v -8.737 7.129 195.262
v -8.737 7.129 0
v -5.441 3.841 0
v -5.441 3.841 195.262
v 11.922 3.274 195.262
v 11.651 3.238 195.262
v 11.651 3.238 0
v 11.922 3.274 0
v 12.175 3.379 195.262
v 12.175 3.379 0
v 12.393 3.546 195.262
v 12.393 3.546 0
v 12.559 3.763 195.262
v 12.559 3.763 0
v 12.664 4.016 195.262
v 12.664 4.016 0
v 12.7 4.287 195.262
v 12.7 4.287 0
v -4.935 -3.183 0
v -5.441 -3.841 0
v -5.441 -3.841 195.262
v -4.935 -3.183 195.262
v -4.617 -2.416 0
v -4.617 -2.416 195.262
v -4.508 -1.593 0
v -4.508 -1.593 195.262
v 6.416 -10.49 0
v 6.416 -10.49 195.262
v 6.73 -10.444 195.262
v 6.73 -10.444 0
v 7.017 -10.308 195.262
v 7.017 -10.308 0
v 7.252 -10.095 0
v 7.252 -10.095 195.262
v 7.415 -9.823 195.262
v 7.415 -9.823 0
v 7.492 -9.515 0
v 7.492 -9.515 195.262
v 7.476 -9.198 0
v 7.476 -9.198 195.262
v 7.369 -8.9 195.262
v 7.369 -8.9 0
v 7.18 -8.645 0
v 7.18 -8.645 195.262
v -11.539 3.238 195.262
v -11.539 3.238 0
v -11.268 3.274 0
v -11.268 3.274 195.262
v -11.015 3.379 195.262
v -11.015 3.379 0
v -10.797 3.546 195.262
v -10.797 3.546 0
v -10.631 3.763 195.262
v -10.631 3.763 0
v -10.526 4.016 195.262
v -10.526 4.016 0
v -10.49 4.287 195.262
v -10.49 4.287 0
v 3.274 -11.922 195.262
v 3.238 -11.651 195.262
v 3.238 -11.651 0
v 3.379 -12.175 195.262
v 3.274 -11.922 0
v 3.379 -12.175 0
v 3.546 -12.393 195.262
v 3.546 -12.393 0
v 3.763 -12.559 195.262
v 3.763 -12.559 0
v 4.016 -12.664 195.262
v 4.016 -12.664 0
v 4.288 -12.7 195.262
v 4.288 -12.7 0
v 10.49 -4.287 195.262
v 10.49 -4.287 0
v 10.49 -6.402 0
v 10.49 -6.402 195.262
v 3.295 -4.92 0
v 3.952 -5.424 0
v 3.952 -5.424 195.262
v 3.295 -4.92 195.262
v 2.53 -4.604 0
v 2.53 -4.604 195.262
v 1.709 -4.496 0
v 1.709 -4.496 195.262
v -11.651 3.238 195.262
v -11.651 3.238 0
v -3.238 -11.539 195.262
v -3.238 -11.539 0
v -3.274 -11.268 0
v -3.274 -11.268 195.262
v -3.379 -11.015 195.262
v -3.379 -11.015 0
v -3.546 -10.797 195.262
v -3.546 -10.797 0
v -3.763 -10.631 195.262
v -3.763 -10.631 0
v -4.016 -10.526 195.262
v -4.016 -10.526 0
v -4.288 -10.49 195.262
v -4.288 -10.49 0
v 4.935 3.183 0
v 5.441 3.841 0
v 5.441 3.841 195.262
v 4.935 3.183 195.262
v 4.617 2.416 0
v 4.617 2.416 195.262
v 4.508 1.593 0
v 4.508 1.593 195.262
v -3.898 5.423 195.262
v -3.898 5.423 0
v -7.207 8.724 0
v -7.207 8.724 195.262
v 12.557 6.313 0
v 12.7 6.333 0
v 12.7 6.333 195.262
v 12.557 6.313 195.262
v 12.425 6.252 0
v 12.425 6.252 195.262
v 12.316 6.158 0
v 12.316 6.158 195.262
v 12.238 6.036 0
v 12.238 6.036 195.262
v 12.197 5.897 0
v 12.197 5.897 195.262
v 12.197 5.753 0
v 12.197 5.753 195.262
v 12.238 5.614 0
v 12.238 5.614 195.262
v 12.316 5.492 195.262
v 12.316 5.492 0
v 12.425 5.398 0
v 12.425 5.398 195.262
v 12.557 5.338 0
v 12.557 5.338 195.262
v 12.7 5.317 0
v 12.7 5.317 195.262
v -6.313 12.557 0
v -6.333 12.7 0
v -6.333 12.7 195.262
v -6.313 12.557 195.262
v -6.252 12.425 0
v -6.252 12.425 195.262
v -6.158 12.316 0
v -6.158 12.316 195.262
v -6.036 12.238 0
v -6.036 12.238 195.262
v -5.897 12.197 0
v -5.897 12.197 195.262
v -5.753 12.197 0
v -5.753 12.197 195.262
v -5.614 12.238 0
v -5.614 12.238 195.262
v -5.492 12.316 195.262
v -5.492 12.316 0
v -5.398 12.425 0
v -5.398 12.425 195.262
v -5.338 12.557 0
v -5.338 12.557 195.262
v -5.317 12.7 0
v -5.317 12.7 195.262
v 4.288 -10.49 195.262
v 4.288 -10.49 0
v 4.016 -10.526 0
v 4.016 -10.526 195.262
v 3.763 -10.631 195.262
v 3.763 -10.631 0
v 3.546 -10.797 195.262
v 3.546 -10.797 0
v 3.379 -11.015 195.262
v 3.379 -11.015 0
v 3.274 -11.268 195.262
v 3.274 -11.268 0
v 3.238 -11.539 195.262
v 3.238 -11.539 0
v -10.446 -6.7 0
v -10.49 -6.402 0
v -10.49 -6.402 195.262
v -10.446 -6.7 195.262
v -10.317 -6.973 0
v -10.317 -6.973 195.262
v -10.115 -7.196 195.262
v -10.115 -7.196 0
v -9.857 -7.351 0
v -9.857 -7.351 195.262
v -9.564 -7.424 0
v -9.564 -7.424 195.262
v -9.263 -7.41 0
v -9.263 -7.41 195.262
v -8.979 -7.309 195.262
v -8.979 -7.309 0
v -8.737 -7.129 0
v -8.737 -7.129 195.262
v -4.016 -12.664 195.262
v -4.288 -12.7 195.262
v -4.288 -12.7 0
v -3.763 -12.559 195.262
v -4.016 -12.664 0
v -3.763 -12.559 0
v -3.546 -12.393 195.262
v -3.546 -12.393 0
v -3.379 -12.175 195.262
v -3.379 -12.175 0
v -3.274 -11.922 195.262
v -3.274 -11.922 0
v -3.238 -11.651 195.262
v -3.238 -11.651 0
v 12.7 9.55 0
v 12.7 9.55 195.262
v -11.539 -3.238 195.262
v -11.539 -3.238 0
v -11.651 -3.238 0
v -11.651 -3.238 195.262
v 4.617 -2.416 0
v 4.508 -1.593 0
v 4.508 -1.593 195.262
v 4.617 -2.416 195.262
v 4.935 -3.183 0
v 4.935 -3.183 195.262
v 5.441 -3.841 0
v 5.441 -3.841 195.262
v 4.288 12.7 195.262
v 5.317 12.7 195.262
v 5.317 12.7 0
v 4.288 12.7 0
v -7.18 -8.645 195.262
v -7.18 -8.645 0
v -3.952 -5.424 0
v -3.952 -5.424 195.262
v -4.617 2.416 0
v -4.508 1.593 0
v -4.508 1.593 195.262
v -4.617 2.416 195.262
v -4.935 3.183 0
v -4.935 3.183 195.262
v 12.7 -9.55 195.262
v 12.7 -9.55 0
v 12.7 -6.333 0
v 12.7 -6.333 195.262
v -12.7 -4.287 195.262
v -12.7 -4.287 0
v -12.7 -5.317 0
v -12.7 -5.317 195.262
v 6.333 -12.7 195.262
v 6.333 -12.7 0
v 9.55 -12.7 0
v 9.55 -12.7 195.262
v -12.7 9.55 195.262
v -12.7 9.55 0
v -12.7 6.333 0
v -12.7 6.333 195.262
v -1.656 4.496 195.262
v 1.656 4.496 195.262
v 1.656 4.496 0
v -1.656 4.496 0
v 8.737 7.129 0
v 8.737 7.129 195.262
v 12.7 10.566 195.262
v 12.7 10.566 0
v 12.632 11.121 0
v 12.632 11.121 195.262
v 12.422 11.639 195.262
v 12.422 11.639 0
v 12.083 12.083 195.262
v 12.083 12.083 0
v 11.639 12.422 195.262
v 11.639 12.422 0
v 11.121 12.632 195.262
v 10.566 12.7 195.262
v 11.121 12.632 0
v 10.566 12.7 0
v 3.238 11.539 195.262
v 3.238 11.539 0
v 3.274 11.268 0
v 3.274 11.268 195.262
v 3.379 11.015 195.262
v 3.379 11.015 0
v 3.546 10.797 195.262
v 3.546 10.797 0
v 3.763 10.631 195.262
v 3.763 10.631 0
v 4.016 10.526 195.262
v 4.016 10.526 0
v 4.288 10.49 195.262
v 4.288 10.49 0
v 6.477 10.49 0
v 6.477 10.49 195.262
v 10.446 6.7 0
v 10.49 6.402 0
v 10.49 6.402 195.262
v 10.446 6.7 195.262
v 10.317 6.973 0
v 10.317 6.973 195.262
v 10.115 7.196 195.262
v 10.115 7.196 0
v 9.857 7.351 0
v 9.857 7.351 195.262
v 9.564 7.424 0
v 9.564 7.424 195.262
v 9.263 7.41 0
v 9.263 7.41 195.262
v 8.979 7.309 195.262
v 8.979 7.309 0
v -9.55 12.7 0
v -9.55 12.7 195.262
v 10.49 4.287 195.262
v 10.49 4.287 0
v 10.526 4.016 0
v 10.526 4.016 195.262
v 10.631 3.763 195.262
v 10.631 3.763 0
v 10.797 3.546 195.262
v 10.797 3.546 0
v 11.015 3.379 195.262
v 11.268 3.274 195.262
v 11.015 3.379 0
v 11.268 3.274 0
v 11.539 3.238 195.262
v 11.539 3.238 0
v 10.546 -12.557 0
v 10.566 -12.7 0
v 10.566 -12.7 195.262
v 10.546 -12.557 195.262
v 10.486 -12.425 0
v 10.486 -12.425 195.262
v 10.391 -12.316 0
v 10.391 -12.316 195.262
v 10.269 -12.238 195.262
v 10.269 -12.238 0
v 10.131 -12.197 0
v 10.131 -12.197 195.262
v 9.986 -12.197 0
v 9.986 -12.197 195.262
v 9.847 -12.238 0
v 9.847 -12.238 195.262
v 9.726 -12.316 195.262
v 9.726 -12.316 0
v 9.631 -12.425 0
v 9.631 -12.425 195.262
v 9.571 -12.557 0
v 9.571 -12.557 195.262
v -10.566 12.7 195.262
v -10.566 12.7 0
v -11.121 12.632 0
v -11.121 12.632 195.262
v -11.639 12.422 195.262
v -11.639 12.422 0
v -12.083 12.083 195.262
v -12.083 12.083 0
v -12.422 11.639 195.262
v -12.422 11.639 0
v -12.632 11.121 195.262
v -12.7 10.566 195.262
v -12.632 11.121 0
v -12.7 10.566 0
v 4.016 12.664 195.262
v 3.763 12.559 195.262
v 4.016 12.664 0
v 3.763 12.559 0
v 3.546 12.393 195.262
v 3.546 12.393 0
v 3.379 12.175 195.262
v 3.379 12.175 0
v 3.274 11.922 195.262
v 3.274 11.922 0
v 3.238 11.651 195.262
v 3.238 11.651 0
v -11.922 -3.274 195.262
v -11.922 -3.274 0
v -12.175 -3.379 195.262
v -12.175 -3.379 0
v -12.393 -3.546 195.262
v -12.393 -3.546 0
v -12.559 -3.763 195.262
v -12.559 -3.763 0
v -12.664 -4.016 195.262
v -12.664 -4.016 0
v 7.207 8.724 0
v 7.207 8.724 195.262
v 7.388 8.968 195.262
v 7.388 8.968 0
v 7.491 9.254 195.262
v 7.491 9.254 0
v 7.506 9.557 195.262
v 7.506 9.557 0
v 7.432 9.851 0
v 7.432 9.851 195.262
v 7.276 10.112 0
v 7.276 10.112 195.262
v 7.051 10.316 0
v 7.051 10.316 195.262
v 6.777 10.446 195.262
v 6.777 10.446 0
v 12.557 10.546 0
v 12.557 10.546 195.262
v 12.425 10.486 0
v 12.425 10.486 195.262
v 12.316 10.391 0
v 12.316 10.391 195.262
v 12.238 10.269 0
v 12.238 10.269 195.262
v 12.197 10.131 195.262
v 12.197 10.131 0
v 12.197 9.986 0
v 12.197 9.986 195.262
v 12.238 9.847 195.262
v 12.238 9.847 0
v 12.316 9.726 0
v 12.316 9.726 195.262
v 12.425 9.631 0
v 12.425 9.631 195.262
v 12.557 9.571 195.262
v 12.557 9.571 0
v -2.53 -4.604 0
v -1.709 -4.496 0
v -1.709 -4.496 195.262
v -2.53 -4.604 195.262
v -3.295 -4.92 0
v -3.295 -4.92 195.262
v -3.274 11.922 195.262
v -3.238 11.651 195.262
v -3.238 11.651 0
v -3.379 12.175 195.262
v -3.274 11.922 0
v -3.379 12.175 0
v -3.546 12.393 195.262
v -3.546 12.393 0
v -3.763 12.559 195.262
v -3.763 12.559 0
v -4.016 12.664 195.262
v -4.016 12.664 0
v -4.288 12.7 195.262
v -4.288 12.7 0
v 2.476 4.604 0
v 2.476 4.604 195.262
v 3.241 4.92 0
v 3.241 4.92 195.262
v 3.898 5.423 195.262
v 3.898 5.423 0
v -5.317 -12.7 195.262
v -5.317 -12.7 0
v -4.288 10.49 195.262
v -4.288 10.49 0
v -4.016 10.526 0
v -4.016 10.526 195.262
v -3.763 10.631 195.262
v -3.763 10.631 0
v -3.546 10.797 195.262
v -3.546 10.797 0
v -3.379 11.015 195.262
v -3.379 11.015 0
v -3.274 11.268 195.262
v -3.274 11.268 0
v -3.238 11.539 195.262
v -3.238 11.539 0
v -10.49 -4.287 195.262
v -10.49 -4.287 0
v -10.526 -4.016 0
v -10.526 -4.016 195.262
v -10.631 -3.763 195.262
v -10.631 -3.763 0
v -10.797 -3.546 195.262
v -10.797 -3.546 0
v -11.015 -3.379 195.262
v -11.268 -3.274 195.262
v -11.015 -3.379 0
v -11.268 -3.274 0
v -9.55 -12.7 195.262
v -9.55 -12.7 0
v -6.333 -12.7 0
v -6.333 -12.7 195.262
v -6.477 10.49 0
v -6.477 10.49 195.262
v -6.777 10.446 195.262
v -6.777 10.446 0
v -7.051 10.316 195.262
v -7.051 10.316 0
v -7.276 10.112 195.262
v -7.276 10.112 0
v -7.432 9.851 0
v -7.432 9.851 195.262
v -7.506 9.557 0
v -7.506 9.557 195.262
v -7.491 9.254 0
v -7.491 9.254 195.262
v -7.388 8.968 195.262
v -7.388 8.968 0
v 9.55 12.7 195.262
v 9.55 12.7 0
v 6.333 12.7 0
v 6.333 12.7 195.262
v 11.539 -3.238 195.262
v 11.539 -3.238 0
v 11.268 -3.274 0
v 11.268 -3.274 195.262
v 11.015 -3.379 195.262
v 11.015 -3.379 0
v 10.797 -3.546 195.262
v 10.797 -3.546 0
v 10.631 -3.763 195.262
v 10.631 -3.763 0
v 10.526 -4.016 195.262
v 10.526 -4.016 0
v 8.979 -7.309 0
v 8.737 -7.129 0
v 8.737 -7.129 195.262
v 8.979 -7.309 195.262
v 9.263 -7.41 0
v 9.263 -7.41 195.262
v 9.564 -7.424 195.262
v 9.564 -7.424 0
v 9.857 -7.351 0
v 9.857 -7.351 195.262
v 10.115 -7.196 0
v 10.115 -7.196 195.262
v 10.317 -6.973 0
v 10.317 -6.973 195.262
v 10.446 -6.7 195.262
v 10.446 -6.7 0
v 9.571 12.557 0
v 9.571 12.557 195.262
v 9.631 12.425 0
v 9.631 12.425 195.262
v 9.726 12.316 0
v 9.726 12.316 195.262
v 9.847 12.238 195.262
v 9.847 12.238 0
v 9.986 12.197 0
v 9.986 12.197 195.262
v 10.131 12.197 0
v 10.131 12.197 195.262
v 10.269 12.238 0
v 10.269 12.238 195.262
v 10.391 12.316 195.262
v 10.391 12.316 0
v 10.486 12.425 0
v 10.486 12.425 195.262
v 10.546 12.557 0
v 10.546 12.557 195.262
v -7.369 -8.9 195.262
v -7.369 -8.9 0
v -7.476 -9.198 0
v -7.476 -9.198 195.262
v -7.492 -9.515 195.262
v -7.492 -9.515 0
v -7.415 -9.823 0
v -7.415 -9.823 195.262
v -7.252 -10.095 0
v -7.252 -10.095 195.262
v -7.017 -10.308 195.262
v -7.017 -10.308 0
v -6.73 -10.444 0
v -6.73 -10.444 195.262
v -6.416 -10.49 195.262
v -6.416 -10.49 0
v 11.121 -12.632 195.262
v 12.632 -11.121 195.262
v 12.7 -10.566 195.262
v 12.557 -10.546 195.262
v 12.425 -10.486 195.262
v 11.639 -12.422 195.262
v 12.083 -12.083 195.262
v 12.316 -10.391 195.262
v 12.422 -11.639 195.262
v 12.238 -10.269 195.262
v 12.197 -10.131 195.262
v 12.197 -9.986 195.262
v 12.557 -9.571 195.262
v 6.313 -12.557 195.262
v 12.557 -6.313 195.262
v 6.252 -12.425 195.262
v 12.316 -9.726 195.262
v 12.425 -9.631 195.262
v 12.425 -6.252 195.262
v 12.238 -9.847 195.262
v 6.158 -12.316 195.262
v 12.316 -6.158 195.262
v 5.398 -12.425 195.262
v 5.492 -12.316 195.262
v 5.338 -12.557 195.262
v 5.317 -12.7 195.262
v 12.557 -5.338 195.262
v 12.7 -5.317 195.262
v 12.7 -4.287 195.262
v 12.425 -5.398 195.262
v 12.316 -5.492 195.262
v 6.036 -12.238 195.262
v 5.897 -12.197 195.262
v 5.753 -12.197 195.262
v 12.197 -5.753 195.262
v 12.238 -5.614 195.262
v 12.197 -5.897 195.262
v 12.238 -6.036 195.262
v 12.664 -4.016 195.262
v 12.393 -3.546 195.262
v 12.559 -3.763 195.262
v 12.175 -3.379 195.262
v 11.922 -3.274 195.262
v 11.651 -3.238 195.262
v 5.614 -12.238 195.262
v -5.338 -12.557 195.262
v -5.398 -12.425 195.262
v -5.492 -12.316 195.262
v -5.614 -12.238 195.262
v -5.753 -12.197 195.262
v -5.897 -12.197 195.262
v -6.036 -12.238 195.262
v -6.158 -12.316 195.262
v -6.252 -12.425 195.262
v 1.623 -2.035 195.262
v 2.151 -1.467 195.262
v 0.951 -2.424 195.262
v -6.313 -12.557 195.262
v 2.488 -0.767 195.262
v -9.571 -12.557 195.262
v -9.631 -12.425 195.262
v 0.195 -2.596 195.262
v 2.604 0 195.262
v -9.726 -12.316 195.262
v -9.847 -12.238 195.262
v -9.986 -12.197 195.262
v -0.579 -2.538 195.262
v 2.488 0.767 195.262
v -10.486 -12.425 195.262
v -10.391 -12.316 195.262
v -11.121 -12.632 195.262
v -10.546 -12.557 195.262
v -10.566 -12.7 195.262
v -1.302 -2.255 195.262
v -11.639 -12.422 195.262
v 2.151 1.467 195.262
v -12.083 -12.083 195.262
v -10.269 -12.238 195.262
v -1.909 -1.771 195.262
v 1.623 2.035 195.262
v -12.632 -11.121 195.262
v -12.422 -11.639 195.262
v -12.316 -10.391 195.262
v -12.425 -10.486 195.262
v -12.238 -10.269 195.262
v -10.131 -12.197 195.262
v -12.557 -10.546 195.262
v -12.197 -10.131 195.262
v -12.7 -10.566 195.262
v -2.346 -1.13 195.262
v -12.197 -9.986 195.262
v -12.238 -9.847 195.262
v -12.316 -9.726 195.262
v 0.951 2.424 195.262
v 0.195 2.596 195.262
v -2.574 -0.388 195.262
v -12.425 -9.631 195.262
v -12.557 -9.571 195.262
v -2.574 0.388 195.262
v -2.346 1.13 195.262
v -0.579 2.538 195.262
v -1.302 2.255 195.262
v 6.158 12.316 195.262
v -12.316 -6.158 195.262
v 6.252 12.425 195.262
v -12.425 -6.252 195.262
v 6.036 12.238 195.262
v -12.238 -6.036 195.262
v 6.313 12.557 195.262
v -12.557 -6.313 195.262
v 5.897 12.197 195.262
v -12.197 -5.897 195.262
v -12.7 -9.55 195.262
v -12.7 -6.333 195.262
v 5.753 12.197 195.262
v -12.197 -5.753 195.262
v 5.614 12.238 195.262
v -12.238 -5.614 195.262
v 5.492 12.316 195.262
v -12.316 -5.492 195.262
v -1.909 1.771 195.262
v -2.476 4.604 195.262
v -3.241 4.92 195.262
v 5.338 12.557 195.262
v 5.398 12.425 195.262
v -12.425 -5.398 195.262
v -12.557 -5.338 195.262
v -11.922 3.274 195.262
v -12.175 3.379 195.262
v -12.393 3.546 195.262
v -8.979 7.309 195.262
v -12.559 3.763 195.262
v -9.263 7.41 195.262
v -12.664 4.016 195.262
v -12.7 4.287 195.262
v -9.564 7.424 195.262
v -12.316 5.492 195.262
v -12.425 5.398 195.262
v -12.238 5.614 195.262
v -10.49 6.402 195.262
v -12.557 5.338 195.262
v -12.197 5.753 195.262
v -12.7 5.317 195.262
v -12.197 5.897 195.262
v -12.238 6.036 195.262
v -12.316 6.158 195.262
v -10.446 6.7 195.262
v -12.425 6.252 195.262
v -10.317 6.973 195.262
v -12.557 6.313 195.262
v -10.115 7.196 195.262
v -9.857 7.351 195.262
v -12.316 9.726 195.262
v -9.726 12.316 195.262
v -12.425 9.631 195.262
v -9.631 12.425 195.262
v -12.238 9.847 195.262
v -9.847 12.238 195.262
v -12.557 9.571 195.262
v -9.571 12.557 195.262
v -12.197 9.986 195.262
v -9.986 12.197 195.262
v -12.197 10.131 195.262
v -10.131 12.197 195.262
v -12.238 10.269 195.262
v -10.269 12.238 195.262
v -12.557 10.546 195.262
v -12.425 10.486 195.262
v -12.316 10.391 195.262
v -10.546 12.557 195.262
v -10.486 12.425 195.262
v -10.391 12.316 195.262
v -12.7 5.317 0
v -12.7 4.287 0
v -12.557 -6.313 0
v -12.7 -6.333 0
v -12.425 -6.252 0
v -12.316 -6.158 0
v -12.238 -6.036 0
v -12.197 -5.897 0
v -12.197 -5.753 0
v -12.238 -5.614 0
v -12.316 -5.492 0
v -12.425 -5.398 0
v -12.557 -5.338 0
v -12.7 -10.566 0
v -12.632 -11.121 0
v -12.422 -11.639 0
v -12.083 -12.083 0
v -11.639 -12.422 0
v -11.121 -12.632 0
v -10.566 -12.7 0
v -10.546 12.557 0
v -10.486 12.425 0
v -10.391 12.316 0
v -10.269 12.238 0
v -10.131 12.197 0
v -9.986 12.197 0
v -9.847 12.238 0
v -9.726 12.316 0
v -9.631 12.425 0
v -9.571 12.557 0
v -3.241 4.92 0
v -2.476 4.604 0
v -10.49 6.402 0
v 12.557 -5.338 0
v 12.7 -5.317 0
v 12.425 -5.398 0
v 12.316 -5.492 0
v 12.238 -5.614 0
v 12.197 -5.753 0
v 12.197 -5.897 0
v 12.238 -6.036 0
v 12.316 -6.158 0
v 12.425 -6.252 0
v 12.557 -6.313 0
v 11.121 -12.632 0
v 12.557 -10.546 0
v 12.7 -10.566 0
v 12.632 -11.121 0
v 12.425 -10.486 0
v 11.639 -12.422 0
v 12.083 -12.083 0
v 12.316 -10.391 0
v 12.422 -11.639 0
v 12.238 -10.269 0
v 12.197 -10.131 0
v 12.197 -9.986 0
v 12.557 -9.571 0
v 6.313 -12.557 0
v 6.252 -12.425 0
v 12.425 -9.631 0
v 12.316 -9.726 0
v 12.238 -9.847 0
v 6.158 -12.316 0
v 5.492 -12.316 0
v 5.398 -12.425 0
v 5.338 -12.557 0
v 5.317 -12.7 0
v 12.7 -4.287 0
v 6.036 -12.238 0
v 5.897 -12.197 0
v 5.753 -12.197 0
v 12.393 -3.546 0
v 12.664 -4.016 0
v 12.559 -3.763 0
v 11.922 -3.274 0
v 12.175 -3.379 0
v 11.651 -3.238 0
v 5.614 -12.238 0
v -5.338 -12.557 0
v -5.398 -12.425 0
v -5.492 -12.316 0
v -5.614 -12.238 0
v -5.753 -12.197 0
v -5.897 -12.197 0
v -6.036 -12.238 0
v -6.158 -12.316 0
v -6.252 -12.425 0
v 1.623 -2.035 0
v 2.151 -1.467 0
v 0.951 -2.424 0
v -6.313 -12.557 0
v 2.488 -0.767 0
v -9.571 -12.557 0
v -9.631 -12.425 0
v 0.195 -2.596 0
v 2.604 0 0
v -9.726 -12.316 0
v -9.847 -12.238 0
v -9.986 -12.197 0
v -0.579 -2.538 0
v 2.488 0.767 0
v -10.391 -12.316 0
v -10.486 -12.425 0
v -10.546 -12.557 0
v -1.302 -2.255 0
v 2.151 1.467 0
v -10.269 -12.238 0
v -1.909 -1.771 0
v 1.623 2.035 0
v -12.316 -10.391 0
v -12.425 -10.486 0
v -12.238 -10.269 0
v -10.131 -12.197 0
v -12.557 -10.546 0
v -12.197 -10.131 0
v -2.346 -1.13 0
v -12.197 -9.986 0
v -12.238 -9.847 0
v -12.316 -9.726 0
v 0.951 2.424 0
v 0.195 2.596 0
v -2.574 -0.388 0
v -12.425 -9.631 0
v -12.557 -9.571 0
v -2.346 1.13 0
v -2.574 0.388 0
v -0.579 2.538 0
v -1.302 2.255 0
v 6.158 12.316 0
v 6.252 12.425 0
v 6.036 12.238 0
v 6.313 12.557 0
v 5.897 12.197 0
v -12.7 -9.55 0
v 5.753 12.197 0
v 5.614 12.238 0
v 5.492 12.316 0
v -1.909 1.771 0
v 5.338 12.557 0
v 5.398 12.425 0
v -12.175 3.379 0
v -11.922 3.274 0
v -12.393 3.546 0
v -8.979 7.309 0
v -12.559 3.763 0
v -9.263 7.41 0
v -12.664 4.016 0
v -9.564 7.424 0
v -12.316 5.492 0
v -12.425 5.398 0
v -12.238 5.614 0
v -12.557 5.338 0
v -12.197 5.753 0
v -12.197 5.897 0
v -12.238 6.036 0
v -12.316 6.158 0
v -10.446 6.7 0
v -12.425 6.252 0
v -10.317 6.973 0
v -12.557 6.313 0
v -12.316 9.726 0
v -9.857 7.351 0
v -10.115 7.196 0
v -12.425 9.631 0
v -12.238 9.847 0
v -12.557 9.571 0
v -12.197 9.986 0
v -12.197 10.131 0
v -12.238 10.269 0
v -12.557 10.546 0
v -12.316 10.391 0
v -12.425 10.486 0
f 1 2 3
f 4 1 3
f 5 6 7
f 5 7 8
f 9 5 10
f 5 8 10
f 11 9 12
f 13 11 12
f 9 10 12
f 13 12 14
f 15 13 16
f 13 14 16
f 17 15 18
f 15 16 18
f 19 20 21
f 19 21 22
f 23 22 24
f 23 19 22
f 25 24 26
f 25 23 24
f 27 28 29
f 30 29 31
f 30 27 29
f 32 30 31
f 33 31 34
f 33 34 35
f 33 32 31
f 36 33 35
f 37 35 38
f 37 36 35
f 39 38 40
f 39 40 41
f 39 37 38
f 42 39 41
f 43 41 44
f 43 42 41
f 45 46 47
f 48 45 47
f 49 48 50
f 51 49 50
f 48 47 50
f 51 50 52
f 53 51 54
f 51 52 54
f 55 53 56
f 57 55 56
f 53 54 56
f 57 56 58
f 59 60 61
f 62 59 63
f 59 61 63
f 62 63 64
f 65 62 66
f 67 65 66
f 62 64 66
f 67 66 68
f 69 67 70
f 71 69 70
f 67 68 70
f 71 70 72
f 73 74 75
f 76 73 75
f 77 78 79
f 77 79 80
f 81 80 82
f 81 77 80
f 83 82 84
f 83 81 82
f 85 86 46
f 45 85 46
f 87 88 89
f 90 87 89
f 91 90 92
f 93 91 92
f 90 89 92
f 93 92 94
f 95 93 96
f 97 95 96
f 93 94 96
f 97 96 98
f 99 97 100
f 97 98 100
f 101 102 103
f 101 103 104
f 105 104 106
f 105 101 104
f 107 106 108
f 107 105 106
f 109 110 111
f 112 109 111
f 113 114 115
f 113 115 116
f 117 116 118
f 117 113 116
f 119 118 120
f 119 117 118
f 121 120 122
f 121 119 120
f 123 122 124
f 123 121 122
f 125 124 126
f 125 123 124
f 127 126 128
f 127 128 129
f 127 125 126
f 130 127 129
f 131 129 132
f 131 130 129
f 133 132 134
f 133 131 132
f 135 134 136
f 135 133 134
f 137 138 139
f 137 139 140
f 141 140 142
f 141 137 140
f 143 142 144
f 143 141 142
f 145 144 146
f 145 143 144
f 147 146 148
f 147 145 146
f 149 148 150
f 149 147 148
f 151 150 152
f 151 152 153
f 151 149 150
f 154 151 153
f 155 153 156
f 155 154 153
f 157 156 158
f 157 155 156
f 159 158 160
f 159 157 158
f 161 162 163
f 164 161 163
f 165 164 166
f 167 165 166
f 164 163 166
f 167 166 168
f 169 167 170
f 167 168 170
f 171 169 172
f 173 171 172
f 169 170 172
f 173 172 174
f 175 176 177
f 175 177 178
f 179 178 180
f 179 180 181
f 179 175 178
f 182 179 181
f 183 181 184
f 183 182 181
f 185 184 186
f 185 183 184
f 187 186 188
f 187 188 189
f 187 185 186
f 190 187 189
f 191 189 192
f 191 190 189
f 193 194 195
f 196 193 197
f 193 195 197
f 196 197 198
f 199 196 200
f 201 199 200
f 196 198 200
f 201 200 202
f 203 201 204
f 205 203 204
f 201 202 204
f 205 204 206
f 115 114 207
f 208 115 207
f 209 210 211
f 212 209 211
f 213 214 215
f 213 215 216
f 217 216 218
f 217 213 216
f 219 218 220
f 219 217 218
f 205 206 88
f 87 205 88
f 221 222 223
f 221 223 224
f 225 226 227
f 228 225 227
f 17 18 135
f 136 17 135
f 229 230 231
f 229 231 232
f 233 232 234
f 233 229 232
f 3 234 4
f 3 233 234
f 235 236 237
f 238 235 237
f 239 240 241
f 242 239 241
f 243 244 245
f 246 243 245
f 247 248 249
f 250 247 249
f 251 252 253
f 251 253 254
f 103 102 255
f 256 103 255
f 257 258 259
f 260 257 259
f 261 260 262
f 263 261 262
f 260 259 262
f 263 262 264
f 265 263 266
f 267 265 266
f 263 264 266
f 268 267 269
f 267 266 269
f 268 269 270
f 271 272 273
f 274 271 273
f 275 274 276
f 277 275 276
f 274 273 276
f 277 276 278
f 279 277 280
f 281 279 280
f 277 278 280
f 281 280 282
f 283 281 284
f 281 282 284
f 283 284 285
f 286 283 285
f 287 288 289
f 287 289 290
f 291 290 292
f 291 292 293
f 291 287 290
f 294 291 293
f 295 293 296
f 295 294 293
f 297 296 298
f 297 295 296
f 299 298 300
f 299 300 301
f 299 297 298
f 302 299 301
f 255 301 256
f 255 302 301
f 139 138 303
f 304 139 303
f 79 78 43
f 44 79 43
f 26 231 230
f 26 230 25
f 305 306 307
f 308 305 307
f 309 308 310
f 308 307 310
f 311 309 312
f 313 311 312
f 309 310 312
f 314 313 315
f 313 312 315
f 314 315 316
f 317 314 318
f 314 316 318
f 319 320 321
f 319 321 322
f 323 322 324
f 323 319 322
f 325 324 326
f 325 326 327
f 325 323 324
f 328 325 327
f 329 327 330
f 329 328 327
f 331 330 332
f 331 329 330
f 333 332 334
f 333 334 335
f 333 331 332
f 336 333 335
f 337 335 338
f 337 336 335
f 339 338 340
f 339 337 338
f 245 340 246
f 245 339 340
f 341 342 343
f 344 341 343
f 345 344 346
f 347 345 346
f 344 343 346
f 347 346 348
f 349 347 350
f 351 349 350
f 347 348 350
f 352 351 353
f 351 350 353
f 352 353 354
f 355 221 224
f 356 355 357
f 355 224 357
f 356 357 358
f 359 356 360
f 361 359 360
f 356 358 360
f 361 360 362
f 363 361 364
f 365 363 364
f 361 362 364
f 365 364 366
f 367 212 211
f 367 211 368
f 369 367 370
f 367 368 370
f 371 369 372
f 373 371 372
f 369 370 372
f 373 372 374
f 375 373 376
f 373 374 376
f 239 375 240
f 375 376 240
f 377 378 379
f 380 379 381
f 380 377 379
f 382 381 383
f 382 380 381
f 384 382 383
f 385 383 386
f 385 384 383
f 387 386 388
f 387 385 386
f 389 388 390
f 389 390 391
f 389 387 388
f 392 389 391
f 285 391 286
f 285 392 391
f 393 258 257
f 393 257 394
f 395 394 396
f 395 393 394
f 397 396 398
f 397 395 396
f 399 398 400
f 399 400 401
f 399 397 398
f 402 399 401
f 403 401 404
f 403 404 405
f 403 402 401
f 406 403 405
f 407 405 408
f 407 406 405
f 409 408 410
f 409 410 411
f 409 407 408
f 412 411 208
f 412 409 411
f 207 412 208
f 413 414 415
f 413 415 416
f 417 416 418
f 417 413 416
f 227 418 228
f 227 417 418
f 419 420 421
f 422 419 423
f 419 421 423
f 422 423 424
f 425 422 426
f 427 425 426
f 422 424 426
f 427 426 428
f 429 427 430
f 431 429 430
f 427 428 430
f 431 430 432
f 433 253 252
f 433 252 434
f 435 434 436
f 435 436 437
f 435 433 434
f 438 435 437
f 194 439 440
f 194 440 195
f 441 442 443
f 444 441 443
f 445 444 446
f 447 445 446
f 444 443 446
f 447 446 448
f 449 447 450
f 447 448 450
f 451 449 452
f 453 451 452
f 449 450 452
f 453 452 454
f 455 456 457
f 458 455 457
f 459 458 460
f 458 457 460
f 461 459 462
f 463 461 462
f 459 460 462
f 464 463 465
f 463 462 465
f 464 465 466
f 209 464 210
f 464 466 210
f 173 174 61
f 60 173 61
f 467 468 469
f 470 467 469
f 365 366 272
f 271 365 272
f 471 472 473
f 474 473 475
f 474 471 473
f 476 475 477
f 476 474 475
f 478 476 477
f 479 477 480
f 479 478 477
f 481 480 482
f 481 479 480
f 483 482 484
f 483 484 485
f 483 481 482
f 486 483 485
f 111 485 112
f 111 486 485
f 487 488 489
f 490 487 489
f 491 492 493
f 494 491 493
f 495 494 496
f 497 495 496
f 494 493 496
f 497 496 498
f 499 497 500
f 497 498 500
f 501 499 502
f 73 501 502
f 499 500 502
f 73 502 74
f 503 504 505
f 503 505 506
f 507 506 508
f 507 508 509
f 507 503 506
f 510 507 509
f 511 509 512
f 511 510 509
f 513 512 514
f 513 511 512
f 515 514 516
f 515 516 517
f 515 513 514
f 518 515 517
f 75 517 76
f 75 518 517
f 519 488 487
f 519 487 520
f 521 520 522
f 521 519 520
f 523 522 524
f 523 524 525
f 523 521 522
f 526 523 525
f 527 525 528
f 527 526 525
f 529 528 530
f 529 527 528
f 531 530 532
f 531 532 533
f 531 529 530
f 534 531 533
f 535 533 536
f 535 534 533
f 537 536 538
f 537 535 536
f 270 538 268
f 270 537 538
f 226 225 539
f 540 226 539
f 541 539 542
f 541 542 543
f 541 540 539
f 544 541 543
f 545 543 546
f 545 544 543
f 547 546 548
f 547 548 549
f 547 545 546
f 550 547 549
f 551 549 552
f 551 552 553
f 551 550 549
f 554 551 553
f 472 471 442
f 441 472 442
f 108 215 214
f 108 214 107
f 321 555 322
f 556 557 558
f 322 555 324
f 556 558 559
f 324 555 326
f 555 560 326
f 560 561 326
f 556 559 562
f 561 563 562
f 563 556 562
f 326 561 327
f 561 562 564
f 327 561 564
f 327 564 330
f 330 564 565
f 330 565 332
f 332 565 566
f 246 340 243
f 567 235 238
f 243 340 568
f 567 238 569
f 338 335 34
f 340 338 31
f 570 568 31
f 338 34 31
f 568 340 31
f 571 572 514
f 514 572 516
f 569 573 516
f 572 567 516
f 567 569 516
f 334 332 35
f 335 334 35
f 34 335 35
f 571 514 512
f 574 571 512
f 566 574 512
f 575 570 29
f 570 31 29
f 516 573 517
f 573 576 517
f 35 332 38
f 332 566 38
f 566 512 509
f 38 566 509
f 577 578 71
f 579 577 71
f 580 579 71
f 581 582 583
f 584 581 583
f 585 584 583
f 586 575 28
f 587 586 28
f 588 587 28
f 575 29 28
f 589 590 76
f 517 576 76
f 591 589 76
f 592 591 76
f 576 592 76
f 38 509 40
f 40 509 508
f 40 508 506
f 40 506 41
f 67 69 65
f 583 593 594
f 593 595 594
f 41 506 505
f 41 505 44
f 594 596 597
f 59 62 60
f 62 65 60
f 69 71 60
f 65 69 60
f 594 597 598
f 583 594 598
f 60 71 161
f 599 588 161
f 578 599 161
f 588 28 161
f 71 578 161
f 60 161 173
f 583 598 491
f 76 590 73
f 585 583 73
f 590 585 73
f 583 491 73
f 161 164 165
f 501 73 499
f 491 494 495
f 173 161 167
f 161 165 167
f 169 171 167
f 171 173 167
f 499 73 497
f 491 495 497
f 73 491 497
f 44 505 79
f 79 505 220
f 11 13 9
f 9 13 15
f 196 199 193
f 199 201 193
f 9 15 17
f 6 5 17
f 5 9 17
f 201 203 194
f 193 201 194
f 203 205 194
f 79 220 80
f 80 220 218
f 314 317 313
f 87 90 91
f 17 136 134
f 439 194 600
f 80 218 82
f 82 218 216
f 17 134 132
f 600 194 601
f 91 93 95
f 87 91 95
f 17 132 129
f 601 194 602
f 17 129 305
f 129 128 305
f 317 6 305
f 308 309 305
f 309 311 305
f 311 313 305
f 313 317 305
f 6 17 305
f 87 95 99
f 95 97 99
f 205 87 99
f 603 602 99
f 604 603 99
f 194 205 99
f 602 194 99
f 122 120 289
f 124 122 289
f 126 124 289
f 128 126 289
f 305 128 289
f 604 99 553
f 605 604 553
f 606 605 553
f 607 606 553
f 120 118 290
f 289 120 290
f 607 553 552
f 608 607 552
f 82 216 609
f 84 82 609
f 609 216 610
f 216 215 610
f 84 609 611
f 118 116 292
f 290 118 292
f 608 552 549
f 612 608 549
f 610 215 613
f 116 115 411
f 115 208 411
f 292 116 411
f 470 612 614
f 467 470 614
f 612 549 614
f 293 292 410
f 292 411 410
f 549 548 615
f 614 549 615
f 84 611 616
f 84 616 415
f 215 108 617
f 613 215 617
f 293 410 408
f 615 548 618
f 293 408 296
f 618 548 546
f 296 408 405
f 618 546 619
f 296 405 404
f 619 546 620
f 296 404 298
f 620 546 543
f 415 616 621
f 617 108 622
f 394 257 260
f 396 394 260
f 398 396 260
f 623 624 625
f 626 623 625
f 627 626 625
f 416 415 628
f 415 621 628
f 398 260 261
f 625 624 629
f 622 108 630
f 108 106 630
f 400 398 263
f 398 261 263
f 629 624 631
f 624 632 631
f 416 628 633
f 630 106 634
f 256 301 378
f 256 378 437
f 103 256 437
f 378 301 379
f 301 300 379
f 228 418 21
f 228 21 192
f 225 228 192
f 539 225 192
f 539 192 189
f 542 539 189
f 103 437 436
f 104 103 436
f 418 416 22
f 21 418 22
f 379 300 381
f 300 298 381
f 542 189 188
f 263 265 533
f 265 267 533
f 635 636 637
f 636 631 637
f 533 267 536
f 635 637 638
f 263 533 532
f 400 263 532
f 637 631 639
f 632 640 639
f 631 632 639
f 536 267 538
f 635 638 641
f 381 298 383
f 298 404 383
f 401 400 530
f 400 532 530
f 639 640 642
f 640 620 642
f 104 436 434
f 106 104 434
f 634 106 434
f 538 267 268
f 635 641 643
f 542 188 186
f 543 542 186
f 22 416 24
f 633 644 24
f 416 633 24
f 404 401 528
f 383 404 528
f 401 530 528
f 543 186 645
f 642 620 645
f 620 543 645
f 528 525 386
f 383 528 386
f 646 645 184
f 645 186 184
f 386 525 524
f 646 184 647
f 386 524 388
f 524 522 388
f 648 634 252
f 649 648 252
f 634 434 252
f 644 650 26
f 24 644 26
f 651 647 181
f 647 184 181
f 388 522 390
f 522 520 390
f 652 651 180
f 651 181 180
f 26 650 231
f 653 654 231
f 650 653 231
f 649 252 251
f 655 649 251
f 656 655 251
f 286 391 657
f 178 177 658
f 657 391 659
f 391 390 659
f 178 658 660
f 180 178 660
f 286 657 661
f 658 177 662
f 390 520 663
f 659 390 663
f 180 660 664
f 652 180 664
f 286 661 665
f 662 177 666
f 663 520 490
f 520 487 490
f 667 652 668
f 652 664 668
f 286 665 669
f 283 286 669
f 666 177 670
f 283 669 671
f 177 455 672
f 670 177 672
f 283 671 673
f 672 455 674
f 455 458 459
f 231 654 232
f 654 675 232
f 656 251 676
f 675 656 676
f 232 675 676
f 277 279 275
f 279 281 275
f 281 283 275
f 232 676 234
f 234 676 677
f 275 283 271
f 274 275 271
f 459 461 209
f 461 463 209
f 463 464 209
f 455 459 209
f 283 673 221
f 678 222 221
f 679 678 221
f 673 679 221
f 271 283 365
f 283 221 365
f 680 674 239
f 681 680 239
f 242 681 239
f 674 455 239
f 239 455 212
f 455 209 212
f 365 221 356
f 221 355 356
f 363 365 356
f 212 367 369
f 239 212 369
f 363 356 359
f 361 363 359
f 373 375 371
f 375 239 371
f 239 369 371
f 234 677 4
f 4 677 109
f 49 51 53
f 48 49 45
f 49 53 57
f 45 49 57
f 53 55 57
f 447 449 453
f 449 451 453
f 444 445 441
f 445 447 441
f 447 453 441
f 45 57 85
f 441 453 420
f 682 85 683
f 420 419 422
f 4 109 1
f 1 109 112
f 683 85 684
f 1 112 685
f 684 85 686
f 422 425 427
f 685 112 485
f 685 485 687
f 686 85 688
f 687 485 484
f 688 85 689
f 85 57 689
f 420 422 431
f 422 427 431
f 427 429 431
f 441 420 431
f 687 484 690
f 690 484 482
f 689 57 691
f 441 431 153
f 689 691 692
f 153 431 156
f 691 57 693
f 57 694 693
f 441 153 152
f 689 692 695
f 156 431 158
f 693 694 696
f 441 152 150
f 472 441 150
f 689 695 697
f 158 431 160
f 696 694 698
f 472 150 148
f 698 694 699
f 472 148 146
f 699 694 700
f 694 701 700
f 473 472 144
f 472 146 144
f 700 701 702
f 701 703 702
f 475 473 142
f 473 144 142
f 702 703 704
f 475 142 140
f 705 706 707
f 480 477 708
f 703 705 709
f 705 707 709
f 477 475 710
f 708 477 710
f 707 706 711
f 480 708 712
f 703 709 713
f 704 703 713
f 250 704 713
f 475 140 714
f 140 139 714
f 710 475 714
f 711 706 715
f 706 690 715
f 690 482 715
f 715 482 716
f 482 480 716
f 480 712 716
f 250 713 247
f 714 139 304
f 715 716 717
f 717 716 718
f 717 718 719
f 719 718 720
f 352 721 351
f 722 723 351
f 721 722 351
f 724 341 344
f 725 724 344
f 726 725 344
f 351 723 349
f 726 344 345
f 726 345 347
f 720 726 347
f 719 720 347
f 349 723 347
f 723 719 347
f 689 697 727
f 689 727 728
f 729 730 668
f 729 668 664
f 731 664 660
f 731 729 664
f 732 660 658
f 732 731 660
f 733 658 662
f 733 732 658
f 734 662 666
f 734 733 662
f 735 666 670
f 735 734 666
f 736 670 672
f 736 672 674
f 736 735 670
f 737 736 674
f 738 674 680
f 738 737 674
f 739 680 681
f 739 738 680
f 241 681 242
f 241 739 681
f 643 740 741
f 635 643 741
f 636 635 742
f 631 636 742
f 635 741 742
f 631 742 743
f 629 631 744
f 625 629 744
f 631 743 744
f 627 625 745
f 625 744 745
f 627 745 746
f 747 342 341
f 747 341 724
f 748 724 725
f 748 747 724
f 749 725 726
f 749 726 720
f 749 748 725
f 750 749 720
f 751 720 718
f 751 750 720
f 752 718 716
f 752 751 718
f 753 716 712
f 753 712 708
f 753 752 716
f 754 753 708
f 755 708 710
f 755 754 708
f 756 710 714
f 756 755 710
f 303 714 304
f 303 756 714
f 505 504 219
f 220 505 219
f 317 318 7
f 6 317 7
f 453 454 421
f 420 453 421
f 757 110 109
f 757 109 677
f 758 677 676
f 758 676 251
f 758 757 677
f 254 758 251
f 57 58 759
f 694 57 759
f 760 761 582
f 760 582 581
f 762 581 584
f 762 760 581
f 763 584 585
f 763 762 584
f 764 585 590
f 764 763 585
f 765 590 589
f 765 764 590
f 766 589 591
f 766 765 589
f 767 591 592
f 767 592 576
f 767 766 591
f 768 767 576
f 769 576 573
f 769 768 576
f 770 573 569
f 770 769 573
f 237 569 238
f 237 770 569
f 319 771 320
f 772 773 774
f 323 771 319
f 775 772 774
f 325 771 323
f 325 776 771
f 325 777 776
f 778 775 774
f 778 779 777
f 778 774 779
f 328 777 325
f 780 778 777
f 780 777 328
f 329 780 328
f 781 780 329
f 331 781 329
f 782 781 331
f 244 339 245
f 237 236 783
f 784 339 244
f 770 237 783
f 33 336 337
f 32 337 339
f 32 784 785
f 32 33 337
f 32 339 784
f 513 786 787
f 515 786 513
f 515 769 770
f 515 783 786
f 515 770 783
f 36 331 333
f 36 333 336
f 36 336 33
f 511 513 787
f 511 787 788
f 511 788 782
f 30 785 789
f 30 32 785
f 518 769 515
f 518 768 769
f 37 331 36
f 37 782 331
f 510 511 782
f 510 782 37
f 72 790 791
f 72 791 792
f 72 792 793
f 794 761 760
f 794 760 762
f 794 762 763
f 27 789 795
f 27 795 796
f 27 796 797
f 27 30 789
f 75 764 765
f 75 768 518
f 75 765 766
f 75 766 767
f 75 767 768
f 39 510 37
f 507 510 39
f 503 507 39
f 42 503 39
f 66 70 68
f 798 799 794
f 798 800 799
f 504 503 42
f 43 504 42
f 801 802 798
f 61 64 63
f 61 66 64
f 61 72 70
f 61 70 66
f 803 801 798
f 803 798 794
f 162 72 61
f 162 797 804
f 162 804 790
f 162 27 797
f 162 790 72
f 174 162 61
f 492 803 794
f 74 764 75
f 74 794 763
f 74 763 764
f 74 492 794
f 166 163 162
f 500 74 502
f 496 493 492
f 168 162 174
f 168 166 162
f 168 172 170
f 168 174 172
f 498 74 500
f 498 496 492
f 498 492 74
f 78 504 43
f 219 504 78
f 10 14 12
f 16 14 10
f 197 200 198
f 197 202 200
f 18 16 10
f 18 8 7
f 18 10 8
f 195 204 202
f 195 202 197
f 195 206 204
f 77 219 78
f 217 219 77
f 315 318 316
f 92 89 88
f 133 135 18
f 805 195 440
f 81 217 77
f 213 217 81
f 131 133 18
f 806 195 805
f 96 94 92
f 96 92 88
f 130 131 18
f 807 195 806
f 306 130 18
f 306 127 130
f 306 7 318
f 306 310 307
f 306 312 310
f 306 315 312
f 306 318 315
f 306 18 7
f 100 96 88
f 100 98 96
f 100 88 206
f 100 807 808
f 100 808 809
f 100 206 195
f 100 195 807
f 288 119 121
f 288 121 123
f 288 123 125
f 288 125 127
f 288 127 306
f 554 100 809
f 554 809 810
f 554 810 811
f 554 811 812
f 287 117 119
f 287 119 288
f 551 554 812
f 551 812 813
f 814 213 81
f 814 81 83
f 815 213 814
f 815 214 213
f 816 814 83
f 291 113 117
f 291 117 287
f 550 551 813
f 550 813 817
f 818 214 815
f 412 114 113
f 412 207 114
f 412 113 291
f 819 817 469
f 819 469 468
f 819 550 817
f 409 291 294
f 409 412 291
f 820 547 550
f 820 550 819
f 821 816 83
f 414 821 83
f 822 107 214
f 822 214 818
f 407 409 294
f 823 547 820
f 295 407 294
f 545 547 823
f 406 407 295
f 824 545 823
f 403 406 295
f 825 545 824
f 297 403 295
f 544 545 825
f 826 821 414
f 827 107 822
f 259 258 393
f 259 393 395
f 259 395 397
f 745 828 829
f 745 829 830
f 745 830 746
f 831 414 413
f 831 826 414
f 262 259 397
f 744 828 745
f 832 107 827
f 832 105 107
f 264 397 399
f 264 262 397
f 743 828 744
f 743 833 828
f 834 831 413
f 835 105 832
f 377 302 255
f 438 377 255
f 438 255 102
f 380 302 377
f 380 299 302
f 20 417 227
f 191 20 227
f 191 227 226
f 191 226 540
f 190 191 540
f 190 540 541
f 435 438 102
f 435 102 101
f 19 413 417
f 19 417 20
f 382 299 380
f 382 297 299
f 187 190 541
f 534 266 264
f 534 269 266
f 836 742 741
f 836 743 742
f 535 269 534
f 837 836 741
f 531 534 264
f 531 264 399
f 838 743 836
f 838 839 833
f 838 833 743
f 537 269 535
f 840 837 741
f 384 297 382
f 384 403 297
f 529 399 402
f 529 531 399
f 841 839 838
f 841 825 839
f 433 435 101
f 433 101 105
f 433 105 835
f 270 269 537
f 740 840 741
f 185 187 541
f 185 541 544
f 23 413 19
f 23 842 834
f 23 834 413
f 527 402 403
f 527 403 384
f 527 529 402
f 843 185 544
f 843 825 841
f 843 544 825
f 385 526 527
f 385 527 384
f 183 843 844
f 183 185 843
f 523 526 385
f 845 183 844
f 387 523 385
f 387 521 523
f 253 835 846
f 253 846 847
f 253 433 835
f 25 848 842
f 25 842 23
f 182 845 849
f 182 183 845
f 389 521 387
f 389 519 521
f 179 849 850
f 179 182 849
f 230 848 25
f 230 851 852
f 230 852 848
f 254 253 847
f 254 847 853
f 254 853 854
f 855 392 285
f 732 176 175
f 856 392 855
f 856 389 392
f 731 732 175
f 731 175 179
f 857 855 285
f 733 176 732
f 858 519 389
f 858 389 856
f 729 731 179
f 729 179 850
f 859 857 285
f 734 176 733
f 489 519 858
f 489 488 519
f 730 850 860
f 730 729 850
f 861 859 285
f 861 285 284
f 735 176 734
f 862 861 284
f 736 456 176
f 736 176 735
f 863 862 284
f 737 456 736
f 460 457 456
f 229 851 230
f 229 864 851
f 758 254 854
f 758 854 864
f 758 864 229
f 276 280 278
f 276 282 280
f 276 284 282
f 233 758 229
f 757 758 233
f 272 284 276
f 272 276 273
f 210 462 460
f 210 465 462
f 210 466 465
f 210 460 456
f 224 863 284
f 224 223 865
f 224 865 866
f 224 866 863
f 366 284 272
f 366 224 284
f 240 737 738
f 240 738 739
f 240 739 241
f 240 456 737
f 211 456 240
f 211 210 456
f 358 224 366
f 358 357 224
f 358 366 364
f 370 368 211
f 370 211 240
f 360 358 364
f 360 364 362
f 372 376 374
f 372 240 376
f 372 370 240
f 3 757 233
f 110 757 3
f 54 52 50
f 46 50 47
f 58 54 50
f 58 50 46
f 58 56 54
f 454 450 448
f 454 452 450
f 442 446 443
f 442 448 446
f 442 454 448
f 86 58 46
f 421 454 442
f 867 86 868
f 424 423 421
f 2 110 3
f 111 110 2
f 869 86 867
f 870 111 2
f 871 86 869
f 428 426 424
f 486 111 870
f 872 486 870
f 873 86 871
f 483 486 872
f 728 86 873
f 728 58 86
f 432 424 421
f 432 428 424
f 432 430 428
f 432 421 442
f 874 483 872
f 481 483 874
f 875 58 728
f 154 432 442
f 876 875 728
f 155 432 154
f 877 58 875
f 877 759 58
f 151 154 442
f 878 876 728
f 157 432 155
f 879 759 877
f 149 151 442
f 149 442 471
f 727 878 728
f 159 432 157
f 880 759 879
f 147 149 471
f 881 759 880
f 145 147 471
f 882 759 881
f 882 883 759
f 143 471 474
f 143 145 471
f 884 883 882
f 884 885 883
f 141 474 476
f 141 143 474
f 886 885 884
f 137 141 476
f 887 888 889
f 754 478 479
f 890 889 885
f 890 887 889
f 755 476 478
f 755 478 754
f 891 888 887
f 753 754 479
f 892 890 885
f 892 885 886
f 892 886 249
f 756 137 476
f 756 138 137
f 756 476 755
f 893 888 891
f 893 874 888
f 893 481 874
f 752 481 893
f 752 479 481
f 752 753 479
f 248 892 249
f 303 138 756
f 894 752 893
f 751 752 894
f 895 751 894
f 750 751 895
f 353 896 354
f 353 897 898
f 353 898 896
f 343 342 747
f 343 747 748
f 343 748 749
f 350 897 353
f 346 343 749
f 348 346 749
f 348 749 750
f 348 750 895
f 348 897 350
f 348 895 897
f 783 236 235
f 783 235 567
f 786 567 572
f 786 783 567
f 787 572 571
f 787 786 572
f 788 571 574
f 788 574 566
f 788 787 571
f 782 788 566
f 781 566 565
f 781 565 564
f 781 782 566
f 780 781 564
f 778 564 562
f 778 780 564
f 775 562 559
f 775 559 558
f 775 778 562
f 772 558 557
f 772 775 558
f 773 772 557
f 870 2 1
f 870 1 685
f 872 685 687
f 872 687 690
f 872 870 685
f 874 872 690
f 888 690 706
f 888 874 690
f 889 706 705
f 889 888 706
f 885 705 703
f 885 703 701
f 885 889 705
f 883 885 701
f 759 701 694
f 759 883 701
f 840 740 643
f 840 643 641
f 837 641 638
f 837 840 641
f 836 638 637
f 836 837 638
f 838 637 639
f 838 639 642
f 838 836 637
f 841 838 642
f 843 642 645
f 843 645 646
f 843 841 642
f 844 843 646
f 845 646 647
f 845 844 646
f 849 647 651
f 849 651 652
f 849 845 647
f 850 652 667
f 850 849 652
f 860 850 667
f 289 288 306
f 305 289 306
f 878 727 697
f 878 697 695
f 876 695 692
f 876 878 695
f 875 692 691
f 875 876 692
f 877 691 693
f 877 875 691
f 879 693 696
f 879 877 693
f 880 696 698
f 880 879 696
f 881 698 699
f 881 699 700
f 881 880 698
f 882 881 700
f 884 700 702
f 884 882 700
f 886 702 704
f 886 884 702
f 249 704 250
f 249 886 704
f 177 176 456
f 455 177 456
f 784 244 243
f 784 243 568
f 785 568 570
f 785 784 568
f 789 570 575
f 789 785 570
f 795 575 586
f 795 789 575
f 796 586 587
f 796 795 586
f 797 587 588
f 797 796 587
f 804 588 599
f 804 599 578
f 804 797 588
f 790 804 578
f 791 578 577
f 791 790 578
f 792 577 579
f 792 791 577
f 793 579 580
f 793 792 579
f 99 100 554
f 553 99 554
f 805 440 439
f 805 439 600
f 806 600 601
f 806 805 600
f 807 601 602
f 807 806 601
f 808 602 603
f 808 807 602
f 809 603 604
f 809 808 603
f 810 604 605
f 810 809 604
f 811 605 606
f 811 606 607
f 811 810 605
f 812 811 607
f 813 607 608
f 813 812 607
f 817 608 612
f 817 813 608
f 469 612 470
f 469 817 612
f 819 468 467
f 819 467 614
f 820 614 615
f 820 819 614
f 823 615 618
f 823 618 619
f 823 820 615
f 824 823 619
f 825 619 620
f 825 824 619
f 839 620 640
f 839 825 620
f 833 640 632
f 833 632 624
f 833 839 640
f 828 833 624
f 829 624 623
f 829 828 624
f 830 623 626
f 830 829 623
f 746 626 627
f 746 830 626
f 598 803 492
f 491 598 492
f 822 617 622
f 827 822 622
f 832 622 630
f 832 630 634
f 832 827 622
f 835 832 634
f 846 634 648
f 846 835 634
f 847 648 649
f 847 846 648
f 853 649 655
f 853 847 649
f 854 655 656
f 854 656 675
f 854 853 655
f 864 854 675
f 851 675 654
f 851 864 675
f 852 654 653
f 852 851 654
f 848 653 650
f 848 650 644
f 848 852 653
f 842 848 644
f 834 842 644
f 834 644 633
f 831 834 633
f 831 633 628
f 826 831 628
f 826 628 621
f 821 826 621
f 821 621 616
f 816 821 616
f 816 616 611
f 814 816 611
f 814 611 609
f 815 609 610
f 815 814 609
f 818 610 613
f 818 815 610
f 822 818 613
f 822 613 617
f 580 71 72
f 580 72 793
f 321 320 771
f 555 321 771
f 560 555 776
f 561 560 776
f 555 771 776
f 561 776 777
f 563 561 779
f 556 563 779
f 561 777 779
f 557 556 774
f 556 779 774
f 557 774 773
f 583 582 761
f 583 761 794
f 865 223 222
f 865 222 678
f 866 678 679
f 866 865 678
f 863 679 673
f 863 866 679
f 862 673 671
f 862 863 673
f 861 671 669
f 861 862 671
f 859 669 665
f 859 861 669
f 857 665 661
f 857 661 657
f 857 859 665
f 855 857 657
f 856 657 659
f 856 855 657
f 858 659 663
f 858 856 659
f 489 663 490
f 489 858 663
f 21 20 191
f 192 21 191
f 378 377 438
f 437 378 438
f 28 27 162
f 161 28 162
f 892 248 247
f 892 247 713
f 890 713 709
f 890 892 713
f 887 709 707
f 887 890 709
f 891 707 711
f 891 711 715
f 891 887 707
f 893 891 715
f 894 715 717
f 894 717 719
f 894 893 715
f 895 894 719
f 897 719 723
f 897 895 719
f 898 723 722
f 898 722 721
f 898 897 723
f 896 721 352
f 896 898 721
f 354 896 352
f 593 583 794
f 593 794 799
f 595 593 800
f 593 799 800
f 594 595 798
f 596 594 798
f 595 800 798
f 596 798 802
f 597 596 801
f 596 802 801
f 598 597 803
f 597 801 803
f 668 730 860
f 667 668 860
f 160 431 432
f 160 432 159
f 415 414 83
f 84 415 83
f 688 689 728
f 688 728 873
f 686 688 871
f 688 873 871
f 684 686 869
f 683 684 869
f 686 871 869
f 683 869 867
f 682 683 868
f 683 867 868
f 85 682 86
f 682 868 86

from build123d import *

# Parameters (mm, degrees)
SKETCH097_R   = 2.6035
EXTRUDE_DEPTH = 195.262


with BuildPart() as part:
    # Sketch097 → Extrude (new body)
    with BuildSketch(Plane.XY):
        with BuildLine():
            ThreePointArc((12.7, 6.333084), (12.192, 5.825084), (12.7, 5.317084))
            Line((12.7, 4.287469), (12.7, 5.317084))
            ThreePointArc((11.650988, 3.238457), (12.392751, 3.545706), (12.7, 4.287469))
            Line((11.539212, 3.238457), (11.650988, 3.238457))
            ThreePointArc((10.4902, 4.287469), (10.797449, 3.545706), (11.539212, 3.238457))
            Line((10.4902, 6.402089), (10.4902, 4.287469))
            ThreePointArc((10.4902, 6.402089), (9.856505, 7.351068), (8.737131, 7.129409))
            Line((5.441006, 3.840816), (8.737131, 7.129409))
            ThreePointArc((5.441006, 3.840816), (4.750878, 2.809883), (4.5085, 1.593186))
            Line((4.5085, -1.593186), (4.5085, 1.593186))
            ThreePointArc((4.5085, -1.593186), (4.750878, -2.809883), (5.441006, -3.840816))
            Line((8.737131, -7.129409), (5.441006, -3.840816))
            ThreePointArc((8.737131, -7.129409), (9.856505, -7.351068), (10.4902, -6.402089))
            Line((10.4902, -4.287469), (10.4902, -6.402089))
            ThreePointArc((11.539212, -3.238457), (10.797449, -3.545706), (10.4902, -4.287469))
            Line((11.650988, -3.238457), (11.539212, -3.238457))
            ThreePointArc((12.7, -4.287469), (12.392751, -3.545706), (11.650988, -3.238457))
            Line((12.7, -5.317084), (12.7, -4.287469))
            ThreePointArc((12.7, -5.317084), (12.192, -5.825084), (12.7, -6.333084))
            Line((12.7, -9.5504), (12.7, -6.333084))
            ThreePointArc((12.7, -9.5504), (12.192, -10.058323), (12.699847, -10.5664))
            ThreePointArc((10.566443, -12.699848), (12.082538, -12.082507), (12.699847, -10.5664))
            ThreePointArc((10.566443, -12.699848), (10.058367, -12.192), (9.550443, -12.7))
            Line((6.333127, -12.7), (9.550443, -12.7))
            ThreePointArc((6.333127, -12.7), (5.825127, -12.192), (5.317127, -12.7))
            Line((4.287512, -12.7), (5.317127, -12.7))
            ThreePointArc((3.2385, -11.650988), (3.545749, -12.392751), (4.287512, -12.7))
            Line((3.2385, -11.539212), (3.2385, -11.650988))
            ThreePointArc((4.287512, -10.4902), (3.545749, -10.797449), (3.2385, -11.539212))
            Line((6.416408, -10.4902), (4.287512, -10.4902))
            ThreePointArc((6.416408, -10.4902), (7.414731, -9.822813), (7.17965, -8.645193))
            Line((3.95227, -5.42369), (7.17965, -8.645193))
            ThreePointArc((3.95227, -5.42369), (2.922936, -4.736929), (1.709254, -4.4958))
            Line((-1.709254, -4.4958), (1.709254, -4.4958))
            ThreePointArc((-1.709254, -4.4958), (-2.922936, -4.736929), (-3.95227, -5.42369))
            Line((-7.17965, -8.645193), (-3.95227, -5.42369))
            ThreePointArc((-7.17965, -8.645193), (-7.414731, -9.822813), (-6.416408, -10.4902))
            Line((-4.287512, -10.4902), (-6.416408, -10.4902))
            ThreePointArc((-3.2385, -11.539212), (-3.545749, -10.797449), (-4.287512, -10.4902))
            Line((-3.2385, -11.650988), (-3.2385, -11.539212))
            ThreePointArc((-4.287512, -12.7), (-3.545749, -12.392751), (-3.2385, -11.650988))
            Line((-5.317127, -12.7), (-4.287512, -12.7))
            ThreePointArc((-5.317127, -12.7), (-5.825127, -12.192), (-6.333127, -12.7))
            Line((-9.550443, -12.7), (-6.333127, -12.7))
            ThreePointArc((-9.550443, -12.7), (-10.058367, -12.192), (-10.566443, -12.699848))
            ThreePointArc((-12.699847, -10.5664), (-12.082538, -12.082507), (-10.566443, -12.699848))
            ThreePointArc((-12.699847, -10.5664), (-12.192, -10.058323), (-12.7, -9.5504))
            Line((-12.7, -6.333084), (-12.7, -9.5504))
            ThreePointArc((-12.7, -6.333084), (-12.192, -5.825084), (-12.7, -5.317084))
            Line((-12.7, -4.287469), (-12.7, -5.317084))
            ThreePointArc((-11.650988, -3.238457), (-12.392751, -3.545706), (-12.7, -4.287469))
            Line((-11.539212, -3.238457), (-11.650988, -3.238457))
            ThreePointArc((-10.4902, -4.287469), (-10.797449, -3.545706), (-11.539212, -3.238457))
            Line((-10.4902, -6.402089), (-10.4902, -4.287469))
            ThreePointArc((-10.4902, -6.402089), (-9.856505, -7.351068), (-8.737131, -7.129409))
            Line((-5.441006, -3.840816), (-8.737131, -7.129409))
            ThreePointArc((-5.441006, -3.840816), (-4.750878, -2.809883), (-4.5085, -1.593186))
            Line((-4.5085, 1.593186), (-4.5085, -1.593186))
            ThreePointArc((-4.5085, 1.593186), (-4.750878, 2.809883), (-5.441006, 3.840816))
            Line((-8.737131, 7.129409), (-5.441006, 3.840816))
            ThreePointArc((-8.737131, 7.129409), (-9.856505, 7.351068), (-10.4902, 6.402089))
            Line((-10.4902, 4.287469), (-10.4902, 6.402089))
            ThreePointArc((-11.539212, 3.238457), (-10.797449, 3.545706), (-10.4902, 4.287469))
            Line((-11.650988, 3.238457), (-11.539212, 3.238457))
            ThreePointArc((-12.7, 4.287469), (-12.392751, 3.545706), (-11.650988, 3.238457))
            Line((-12.7, 5.317084), (-12.7, 4.287469))
            ThreePointArc((-12.7, 5.317084), (-12.192, 5.825084), (-12.7, 6.333084))
            Line((-12.7, 9.5504), (-12.7, 6.333084))
            ThreePointArc((-12.7, 9.5504), (-12.192, 10.058323), (-12.699847, 10.5664))
            ThreePointArc((-10.566443, 12.699848), (-12.082538, 12.082507), (-12.699847, 10.5664))
            ThreePointArc((-10.566443, 12.699848), (-10.058367, 12.192), (-9.550443, 12.7))
            Line((-6.333127, 12.7), (-9.550443, 12.7))
            ThreePointArc((-6.333127, 12.7), (-5.825127, 12.192), (-5.317127, 12.7))
            Line((-4.287512, 12.7), (-5.317127, 12.7))
            ThreePointArc((-3.2385, 11.650988), (-3.545749, 12.392751), (-4.287512, 12.7))
            Line((-3.2385, 11.539212), (-3.2385, 11.650988))
            ThreePointArc((-4.287512, 10.4902), (-3.545749, 10.797449), (-3.2385, 11.539212))
            Line((-6.476789, 10.4902), (-4.287512, 10.4902))
            ThreePointArc((-6.476789, 10.4902), (-7.432222, 9.851404), (-7.207036, 8.724371))
            Line((-3.898273, 5.423169), (-7.207036, 8.724371))
            ThreePointArc((-3.898273, 5.423169), (-2.86912, 4.736788), (-1.655778, 4.4958))
            Line((1.655778, 4.4958), (-1.655778, 4.4958))
            ThreePointArc((1.655778, 4.4958), (2.86912, 4.736788), (3.898273, 5.423169))
            Line((7.207036, 8.724371), (3.898273, 5.423169))
            ThreePointArc((7.207036, 8.724371), (7.432222, 9.851404), (6.476789, 10.4902))
            Line((4.287512, 10.4902), (6.476789, 10.4902))
            ThreePointArc((3.2385, 11.539212), (3.545749, 10.797449), (4.287512, 10.4902))
            Line((3.2385, 11.650988), (3.2385, 11.539212))
            ThreePointArc((4.287512, 12.7), (3.545749, 12.392751), (3.2385, 11.650988))
            Line((5.317127, 12.7), (4.287512, 12.7))
            ThreePointArc((5.317127, 12.7), (5.825127, 12.192), (6.333127, 12.7))
            Line((9.550443, 12.7), (6.333127, 12.7))
            ThreePointArc((9.550443, 12.7), (10.058367, 12.192), (10.566443, 12.699848))
            ThreePointArc((12.699847, 10.5664), (12.082538, 12.082507), (10.566443, 12.699848))
            ThreePointArc((12.699847, 10.5664), (12.192, 10.058323), (12.7, 9.5504))
            Line((12.7, 6.333084), (12.7, 9.5504))
        make_face()
        Circle(SKETCH097_R, mode=Mode.SUBTRACT)
    extrude(amount=EXTRUDE_DEPTH)


solid = part.part
